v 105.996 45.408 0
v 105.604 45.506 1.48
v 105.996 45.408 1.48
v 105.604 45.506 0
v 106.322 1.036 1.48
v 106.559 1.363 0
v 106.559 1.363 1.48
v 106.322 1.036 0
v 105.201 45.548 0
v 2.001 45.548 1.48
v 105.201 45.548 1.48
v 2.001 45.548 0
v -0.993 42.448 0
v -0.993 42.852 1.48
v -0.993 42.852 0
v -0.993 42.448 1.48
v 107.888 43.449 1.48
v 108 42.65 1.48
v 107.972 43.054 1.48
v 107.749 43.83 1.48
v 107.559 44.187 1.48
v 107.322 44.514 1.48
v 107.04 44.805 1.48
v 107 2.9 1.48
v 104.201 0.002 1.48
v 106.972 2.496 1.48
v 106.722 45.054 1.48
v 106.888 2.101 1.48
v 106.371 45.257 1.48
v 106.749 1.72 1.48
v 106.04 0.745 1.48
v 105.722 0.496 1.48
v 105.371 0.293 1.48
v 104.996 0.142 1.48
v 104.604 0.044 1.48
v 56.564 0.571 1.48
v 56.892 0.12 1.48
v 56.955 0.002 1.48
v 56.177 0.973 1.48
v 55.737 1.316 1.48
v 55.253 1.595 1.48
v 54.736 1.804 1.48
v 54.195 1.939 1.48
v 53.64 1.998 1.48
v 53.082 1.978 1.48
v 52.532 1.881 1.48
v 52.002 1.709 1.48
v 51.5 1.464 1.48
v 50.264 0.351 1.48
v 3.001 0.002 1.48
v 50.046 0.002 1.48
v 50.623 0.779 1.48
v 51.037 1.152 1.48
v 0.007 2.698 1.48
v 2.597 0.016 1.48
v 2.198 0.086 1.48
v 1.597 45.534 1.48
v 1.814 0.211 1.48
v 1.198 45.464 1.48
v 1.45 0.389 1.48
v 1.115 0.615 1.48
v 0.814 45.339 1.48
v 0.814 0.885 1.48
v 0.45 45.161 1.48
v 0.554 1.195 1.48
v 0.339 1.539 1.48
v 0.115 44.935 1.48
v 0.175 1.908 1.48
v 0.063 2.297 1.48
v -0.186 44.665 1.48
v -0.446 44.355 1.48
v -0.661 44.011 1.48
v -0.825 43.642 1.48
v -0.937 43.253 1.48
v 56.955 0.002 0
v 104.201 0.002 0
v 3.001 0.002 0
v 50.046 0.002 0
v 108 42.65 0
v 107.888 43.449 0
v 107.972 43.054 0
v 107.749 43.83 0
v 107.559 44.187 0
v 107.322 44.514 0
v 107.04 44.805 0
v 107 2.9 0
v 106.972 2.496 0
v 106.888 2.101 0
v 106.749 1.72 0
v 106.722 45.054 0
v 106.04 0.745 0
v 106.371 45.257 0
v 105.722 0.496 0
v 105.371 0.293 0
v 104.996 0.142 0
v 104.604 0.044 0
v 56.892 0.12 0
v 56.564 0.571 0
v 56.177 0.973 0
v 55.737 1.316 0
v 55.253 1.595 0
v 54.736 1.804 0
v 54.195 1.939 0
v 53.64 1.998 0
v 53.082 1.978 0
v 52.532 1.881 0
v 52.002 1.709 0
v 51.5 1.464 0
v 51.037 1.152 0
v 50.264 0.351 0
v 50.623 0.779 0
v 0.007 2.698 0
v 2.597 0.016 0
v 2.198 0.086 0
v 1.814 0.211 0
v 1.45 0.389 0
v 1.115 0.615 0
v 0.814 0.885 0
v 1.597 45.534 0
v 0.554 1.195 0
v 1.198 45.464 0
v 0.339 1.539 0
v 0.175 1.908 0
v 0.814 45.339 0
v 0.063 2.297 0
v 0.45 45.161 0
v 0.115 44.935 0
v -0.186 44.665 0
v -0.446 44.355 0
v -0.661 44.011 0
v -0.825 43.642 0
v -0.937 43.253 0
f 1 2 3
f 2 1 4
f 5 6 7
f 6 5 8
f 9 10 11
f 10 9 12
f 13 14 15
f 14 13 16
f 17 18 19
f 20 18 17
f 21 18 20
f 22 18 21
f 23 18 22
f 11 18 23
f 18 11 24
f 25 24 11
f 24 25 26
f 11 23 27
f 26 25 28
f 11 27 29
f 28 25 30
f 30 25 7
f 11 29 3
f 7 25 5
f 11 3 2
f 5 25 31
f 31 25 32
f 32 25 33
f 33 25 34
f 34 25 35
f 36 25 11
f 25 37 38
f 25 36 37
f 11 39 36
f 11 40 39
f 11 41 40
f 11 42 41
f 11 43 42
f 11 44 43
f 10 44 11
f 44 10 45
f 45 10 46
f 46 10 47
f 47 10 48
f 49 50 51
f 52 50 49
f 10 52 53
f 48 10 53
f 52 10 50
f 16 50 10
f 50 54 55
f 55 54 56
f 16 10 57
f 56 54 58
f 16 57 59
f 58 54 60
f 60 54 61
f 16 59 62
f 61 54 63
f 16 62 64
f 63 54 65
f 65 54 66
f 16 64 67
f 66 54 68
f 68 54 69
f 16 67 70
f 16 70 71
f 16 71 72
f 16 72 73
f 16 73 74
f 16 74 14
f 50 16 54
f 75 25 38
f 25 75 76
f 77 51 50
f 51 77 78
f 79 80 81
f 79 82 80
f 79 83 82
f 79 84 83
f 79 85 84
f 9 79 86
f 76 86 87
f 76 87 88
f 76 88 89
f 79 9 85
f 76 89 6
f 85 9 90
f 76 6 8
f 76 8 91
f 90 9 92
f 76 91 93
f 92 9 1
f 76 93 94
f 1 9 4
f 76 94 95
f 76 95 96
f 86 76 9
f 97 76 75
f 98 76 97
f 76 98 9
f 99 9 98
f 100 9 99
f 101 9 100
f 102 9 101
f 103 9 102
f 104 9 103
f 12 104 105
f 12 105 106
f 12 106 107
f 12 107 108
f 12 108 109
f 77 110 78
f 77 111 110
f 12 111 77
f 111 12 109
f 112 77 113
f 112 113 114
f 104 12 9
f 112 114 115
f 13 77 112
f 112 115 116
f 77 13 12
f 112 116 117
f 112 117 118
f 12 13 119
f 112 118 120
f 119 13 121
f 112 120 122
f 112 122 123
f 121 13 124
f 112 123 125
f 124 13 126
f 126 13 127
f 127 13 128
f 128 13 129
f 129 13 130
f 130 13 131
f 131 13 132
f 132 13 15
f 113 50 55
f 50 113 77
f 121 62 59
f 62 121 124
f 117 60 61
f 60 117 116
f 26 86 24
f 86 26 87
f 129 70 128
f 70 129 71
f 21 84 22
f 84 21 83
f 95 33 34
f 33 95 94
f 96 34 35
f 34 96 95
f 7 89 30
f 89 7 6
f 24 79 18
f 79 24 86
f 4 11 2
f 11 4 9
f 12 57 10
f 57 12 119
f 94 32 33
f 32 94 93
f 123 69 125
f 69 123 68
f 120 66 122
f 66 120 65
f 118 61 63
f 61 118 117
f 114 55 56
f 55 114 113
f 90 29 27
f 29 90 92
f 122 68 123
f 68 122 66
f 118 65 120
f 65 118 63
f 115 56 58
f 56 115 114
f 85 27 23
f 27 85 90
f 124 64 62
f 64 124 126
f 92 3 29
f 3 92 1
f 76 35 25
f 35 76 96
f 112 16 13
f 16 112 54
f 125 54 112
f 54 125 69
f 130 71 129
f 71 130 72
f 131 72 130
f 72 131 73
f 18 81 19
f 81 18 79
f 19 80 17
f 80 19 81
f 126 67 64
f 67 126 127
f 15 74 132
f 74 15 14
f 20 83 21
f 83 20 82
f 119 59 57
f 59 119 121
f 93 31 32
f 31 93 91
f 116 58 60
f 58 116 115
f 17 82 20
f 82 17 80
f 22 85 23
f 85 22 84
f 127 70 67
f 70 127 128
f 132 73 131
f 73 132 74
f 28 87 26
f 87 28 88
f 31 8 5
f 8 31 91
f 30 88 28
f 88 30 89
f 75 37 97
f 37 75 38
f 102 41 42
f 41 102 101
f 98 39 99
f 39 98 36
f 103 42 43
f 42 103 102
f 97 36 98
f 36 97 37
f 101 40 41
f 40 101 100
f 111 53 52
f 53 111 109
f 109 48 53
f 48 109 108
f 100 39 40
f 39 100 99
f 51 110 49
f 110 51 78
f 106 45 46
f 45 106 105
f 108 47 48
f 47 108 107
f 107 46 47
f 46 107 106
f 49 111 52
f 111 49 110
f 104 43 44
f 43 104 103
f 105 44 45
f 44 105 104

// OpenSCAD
$fn = 45;

depth = 1.48;
corner = 2.9;
// small
//width_top = 51.46;
//width_bot = 50.93;
//height = 27.50;
// large
width_top = 109.00;
width_bot = 107.00;
height = 45.55;

s = (width_top - width_bot) / 2;

difference() {
    hull() {
        translate([corner, corner, 0]) cylinder(r = corner, h = depth);
        translate([corner - s, height - corner, 0]) cylinder(r = corner, h = depth);
        translate([width_bot - corner, corner, 0]) cylinder(r = corner, h = depth);
        translate([width_top - corner - s, height - corner, 0]) cylinder(r = corner, h = depth);
    }
    translate([width_bot / 2, -2, 0]) cylinder(r = 4, h = depth);
}
